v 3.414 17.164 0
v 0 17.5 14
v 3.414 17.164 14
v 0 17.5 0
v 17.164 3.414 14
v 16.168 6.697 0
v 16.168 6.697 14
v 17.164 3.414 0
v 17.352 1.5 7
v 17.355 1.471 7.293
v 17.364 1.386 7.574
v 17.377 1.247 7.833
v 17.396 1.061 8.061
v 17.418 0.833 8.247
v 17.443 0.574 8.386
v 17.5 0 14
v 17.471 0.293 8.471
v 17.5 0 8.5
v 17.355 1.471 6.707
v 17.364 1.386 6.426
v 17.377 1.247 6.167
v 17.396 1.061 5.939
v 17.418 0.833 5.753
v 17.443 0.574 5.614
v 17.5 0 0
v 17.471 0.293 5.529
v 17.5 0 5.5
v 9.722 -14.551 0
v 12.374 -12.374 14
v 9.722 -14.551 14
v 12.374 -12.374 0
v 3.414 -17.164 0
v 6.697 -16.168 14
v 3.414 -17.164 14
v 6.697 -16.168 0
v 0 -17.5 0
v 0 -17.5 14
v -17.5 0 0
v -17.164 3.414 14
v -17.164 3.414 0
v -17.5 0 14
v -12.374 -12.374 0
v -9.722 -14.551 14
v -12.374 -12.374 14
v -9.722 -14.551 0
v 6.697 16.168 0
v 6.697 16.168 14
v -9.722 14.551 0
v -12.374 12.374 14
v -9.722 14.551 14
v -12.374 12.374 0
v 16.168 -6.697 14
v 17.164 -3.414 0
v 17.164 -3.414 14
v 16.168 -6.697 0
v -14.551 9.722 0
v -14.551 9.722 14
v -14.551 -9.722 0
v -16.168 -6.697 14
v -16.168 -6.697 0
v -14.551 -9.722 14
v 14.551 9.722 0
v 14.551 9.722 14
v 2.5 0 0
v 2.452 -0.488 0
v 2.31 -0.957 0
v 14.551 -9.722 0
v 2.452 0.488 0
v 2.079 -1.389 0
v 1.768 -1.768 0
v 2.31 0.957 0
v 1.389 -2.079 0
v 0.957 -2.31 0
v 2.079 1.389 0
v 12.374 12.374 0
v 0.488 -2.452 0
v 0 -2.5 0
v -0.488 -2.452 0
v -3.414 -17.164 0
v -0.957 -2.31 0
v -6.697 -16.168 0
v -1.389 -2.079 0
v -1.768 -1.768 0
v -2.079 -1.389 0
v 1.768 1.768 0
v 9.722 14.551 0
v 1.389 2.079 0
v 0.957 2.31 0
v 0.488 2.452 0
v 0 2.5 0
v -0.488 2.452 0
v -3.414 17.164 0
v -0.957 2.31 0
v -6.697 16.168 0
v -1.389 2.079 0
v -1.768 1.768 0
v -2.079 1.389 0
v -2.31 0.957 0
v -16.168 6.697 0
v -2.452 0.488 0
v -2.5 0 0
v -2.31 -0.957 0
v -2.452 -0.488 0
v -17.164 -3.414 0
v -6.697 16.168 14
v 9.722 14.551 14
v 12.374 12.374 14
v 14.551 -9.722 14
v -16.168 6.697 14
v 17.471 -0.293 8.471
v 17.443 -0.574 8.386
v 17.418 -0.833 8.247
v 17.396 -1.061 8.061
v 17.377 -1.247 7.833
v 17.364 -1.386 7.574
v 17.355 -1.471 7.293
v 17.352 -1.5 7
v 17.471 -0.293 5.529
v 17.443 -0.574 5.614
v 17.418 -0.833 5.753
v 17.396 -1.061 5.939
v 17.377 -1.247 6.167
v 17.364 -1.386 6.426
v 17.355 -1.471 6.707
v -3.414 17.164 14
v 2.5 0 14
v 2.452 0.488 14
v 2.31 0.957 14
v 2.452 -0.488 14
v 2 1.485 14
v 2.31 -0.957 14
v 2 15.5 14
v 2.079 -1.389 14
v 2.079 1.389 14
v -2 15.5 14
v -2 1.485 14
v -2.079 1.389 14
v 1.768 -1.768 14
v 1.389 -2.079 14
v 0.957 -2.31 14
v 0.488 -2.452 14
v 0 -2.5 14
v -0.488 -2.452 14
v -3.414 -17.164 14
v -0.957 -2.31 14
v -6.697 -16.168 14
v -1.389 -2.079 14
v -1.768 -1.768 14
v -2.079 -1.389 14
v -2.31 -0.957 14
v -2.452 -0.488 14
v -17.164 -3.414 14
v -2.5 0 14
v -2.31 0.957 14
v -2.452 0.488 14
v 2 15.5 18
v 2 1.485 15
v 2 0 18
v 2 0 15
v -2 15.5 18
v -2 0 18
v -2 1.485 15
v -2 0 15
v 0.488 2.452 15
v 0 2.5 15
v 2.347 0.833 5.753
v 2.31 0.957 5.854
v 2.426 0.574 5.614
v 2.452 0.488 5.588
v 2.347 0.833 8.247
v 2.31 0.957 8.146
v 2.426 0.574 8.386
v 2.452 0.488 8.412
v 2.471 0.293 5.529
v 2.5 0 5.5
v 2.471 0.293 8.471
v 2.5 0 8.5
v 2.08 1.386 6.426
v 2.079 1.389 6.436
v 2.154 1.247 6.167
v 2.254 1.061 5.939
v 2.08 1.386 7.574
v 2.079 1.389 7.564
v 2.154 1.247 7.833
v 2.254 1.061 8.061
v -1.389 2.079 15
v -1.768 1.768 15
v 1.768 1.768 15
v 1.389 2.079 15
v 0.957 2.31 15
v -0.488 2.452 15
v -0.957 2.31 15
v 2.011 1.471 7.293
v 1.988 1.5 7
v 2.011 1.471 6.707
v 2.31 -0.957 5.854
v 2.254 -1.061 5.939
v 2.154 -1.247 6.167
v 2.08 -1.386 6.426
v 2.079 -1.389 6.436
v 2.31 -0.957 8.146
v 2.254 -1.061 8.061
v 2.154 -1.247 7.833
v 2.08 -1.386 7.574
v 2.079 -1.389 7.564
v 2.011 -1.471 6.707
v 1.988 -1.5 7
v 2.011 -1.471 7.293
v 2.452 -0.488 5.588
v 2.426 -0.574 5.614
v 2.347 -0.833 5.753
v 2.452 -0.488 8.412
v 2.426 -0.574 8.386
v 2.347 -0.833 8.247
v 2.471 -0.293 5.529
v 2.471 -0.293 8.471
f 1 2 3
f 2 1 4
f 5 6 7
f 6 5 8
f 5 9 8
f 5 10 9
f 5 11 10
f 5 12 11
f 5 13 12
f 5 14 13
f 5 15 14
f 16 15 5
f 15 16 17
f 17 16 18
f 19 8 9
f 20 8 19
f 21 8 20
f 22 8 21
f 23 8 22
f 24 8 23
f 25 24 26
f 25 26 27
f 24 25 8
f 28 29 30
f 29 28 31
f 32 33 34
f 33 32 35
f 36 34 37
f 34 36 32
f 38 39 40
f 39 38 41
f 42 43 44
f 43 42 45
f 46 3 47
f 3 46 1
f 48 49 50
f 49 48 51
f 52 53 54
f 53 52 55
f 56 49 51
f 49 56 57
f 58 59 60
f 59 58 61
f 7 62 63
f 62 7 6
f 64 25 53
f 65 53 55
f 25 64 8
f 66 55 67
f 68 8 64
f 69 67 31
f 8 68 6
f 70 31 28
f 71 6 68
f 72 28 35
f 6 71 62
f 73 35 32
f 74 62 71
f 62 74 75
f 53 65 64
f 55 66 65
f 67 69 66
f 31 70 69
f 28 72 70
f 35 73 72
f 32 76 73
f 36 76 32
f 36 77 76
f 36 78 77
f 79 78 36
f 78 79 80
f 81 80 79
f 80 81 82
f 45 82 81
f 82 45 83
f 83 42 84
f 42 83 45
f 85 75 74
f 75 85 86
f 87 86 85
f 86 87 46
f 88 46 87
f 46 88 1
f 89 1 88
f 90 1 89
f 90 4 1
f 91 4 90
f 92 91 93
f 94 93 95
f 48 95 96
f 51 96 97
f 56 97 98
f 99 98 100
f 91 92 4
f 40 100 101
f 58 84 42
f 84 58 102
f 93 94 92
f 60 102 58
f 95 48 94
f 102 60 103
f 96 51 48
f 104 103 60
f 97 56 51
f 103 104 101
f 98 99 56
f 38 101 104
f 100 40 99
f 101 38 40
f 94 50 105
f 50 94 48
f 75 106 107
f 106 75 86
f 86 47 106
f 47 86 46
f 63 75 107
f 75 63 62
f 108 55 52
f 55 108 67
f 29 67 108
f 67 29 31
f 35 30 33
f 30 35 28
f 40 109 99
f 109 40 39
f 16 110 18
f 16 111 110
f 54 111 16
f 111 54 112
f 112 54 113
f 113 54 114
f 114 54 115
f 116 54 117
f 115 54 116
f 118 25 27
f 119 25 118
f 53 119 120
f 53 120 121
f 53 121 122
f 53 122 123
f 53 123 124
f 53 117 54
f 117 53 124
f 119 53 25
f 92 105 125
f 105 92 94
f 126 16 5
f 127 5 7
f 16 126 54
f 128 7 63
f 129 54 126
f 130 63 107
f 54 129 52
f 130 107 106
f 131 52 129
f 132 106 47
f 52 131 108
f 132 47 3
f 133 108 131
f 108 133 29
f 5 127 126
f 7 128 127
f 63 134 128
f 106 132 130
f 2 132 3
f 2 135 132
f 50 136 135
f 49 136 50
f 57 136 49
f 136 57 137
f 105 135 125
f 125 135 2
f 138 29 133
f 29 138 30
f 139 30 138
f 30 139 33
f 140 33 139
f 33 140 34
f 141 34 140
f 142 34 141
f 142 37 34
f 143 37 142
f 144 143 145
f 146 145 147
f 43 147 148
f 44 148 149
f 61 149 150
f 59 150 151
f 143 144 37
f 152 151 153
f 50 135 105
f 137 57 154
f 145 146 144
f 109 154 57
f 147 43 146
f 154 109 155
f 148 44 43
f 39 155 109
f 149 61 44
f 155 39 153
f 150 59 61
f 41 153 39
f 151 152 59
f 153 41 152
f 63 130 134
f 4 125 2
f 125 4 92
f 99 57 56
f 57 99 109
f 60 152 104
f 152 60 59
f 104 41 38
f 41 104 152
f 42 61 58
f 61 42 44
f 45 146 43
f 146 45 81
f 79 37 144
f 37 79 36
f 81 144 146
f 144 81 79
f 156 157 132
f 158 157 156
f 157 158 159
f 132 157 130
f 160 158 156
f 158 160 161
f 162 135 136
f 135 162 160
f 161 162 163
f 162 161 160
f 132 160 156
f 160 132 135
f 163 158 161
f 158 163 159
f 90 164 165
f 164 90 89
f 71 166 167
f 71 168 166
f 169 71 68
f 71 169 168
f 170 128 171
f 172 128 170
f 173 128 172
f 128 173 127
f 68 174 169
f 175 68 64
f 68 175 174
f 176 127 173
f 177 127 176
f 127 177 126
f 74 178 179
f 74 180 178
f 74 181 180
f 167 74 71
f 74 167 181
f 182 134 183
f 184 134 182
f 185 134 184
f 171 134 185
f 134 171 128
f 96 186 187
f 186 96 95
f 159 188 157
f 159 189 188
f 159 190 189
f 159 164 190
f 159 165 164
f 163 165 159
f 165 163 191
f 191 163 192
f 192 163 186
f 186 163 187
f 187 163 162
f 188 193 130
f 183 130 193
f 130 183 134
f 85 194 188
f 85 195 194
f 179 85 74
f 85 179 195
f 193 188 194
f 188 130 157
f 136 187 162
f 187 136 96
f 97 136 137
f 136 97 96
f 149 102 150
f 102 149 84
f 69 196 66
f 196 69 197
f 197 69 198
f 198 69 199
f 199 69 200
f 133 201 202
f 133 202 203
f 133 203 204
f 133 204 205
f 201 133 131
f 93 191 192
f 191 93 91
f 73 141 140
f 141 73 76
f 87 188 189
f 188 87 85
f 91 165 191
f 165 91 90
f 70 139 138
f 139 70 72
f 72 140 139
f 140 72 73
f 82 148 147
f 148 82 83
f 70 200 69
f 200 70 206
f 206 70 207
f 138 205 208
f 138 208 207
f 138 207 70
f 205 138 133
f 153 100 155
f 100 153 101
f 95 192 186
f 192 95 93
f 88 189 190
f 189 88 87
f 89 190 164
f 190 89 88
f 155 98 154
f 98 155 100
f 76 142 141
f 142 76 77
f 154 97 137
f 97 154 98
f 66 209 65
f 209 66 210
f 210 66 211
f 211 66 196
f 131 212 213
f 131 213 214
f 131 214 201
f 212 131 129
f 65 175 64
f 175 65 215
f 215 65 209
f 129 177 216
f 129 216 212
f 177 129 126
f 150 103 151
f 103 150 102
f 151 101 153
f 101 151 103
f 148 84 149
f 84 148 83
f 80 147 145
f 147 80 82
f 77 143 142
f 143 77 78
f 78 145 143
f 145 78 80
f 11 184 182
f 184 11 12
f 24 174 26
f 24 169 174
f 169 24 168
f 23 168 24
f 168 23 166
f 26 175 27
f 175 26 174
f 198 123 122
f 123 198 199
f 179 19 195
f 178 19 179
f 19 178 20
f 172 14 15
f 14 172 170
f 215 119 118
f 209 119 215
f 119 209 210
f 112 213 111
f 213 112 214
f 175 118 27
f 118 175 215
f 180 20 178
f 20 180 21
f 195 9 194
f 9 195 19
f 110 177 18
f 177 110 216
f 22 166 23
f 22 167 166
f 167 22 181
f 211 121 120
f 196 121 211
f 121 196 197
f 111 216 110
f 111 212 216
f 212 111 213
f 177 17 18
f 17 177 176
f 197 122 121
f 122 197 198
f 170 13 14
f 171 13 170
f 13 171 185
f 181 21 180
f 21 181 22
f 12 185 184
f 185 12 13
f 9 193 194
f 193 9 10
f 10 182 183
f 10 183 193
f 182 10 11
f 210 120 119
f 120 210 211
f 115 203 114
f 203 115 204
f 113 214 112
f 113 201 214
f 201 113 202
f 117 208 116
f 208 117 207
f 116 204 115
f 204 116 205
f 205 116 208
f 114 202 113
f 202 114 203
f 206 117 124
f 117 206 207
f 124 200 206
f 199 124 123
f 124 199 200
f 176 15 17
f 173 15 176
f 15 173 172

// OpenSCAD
$fn = 32;

// ----------------------------------------------------------------------
// Control knob: pointer knob
// ----------------------------------------------------------------------

// --- parameters (mm) ---
rib_w = 4;                // pointer rib width
rib_h = 5;                // pointer rib height
knob_d = 35;              // knob body diameter
knob_h = 14;              // knob body height
bore_d = 5;               // shaft bore diameter
set_d = 3;                // set screw bore diameter

rib_poke = rib_h - 1;  // rib height above the top
total_h = knob_h + rib_h - 1;  // overall height

difference() {
  union() {
    cylinder(h = knob_h, d = knob_d);
    translate([-rib_w / 2, 0, knob_h - 1])
      cube([rib_w, knob_d / 2 - 2, rib_h]);
  }
  translate([0, 0, -1]) cylinder(h = knob_h + 2, d = bore_d);
  translate([-1, 0, knob_h / 2]) rotate([0, 90, 0])
    cylinder(h = knob_d / 2 + bore_d / 2 + 2, d = set_d);}
